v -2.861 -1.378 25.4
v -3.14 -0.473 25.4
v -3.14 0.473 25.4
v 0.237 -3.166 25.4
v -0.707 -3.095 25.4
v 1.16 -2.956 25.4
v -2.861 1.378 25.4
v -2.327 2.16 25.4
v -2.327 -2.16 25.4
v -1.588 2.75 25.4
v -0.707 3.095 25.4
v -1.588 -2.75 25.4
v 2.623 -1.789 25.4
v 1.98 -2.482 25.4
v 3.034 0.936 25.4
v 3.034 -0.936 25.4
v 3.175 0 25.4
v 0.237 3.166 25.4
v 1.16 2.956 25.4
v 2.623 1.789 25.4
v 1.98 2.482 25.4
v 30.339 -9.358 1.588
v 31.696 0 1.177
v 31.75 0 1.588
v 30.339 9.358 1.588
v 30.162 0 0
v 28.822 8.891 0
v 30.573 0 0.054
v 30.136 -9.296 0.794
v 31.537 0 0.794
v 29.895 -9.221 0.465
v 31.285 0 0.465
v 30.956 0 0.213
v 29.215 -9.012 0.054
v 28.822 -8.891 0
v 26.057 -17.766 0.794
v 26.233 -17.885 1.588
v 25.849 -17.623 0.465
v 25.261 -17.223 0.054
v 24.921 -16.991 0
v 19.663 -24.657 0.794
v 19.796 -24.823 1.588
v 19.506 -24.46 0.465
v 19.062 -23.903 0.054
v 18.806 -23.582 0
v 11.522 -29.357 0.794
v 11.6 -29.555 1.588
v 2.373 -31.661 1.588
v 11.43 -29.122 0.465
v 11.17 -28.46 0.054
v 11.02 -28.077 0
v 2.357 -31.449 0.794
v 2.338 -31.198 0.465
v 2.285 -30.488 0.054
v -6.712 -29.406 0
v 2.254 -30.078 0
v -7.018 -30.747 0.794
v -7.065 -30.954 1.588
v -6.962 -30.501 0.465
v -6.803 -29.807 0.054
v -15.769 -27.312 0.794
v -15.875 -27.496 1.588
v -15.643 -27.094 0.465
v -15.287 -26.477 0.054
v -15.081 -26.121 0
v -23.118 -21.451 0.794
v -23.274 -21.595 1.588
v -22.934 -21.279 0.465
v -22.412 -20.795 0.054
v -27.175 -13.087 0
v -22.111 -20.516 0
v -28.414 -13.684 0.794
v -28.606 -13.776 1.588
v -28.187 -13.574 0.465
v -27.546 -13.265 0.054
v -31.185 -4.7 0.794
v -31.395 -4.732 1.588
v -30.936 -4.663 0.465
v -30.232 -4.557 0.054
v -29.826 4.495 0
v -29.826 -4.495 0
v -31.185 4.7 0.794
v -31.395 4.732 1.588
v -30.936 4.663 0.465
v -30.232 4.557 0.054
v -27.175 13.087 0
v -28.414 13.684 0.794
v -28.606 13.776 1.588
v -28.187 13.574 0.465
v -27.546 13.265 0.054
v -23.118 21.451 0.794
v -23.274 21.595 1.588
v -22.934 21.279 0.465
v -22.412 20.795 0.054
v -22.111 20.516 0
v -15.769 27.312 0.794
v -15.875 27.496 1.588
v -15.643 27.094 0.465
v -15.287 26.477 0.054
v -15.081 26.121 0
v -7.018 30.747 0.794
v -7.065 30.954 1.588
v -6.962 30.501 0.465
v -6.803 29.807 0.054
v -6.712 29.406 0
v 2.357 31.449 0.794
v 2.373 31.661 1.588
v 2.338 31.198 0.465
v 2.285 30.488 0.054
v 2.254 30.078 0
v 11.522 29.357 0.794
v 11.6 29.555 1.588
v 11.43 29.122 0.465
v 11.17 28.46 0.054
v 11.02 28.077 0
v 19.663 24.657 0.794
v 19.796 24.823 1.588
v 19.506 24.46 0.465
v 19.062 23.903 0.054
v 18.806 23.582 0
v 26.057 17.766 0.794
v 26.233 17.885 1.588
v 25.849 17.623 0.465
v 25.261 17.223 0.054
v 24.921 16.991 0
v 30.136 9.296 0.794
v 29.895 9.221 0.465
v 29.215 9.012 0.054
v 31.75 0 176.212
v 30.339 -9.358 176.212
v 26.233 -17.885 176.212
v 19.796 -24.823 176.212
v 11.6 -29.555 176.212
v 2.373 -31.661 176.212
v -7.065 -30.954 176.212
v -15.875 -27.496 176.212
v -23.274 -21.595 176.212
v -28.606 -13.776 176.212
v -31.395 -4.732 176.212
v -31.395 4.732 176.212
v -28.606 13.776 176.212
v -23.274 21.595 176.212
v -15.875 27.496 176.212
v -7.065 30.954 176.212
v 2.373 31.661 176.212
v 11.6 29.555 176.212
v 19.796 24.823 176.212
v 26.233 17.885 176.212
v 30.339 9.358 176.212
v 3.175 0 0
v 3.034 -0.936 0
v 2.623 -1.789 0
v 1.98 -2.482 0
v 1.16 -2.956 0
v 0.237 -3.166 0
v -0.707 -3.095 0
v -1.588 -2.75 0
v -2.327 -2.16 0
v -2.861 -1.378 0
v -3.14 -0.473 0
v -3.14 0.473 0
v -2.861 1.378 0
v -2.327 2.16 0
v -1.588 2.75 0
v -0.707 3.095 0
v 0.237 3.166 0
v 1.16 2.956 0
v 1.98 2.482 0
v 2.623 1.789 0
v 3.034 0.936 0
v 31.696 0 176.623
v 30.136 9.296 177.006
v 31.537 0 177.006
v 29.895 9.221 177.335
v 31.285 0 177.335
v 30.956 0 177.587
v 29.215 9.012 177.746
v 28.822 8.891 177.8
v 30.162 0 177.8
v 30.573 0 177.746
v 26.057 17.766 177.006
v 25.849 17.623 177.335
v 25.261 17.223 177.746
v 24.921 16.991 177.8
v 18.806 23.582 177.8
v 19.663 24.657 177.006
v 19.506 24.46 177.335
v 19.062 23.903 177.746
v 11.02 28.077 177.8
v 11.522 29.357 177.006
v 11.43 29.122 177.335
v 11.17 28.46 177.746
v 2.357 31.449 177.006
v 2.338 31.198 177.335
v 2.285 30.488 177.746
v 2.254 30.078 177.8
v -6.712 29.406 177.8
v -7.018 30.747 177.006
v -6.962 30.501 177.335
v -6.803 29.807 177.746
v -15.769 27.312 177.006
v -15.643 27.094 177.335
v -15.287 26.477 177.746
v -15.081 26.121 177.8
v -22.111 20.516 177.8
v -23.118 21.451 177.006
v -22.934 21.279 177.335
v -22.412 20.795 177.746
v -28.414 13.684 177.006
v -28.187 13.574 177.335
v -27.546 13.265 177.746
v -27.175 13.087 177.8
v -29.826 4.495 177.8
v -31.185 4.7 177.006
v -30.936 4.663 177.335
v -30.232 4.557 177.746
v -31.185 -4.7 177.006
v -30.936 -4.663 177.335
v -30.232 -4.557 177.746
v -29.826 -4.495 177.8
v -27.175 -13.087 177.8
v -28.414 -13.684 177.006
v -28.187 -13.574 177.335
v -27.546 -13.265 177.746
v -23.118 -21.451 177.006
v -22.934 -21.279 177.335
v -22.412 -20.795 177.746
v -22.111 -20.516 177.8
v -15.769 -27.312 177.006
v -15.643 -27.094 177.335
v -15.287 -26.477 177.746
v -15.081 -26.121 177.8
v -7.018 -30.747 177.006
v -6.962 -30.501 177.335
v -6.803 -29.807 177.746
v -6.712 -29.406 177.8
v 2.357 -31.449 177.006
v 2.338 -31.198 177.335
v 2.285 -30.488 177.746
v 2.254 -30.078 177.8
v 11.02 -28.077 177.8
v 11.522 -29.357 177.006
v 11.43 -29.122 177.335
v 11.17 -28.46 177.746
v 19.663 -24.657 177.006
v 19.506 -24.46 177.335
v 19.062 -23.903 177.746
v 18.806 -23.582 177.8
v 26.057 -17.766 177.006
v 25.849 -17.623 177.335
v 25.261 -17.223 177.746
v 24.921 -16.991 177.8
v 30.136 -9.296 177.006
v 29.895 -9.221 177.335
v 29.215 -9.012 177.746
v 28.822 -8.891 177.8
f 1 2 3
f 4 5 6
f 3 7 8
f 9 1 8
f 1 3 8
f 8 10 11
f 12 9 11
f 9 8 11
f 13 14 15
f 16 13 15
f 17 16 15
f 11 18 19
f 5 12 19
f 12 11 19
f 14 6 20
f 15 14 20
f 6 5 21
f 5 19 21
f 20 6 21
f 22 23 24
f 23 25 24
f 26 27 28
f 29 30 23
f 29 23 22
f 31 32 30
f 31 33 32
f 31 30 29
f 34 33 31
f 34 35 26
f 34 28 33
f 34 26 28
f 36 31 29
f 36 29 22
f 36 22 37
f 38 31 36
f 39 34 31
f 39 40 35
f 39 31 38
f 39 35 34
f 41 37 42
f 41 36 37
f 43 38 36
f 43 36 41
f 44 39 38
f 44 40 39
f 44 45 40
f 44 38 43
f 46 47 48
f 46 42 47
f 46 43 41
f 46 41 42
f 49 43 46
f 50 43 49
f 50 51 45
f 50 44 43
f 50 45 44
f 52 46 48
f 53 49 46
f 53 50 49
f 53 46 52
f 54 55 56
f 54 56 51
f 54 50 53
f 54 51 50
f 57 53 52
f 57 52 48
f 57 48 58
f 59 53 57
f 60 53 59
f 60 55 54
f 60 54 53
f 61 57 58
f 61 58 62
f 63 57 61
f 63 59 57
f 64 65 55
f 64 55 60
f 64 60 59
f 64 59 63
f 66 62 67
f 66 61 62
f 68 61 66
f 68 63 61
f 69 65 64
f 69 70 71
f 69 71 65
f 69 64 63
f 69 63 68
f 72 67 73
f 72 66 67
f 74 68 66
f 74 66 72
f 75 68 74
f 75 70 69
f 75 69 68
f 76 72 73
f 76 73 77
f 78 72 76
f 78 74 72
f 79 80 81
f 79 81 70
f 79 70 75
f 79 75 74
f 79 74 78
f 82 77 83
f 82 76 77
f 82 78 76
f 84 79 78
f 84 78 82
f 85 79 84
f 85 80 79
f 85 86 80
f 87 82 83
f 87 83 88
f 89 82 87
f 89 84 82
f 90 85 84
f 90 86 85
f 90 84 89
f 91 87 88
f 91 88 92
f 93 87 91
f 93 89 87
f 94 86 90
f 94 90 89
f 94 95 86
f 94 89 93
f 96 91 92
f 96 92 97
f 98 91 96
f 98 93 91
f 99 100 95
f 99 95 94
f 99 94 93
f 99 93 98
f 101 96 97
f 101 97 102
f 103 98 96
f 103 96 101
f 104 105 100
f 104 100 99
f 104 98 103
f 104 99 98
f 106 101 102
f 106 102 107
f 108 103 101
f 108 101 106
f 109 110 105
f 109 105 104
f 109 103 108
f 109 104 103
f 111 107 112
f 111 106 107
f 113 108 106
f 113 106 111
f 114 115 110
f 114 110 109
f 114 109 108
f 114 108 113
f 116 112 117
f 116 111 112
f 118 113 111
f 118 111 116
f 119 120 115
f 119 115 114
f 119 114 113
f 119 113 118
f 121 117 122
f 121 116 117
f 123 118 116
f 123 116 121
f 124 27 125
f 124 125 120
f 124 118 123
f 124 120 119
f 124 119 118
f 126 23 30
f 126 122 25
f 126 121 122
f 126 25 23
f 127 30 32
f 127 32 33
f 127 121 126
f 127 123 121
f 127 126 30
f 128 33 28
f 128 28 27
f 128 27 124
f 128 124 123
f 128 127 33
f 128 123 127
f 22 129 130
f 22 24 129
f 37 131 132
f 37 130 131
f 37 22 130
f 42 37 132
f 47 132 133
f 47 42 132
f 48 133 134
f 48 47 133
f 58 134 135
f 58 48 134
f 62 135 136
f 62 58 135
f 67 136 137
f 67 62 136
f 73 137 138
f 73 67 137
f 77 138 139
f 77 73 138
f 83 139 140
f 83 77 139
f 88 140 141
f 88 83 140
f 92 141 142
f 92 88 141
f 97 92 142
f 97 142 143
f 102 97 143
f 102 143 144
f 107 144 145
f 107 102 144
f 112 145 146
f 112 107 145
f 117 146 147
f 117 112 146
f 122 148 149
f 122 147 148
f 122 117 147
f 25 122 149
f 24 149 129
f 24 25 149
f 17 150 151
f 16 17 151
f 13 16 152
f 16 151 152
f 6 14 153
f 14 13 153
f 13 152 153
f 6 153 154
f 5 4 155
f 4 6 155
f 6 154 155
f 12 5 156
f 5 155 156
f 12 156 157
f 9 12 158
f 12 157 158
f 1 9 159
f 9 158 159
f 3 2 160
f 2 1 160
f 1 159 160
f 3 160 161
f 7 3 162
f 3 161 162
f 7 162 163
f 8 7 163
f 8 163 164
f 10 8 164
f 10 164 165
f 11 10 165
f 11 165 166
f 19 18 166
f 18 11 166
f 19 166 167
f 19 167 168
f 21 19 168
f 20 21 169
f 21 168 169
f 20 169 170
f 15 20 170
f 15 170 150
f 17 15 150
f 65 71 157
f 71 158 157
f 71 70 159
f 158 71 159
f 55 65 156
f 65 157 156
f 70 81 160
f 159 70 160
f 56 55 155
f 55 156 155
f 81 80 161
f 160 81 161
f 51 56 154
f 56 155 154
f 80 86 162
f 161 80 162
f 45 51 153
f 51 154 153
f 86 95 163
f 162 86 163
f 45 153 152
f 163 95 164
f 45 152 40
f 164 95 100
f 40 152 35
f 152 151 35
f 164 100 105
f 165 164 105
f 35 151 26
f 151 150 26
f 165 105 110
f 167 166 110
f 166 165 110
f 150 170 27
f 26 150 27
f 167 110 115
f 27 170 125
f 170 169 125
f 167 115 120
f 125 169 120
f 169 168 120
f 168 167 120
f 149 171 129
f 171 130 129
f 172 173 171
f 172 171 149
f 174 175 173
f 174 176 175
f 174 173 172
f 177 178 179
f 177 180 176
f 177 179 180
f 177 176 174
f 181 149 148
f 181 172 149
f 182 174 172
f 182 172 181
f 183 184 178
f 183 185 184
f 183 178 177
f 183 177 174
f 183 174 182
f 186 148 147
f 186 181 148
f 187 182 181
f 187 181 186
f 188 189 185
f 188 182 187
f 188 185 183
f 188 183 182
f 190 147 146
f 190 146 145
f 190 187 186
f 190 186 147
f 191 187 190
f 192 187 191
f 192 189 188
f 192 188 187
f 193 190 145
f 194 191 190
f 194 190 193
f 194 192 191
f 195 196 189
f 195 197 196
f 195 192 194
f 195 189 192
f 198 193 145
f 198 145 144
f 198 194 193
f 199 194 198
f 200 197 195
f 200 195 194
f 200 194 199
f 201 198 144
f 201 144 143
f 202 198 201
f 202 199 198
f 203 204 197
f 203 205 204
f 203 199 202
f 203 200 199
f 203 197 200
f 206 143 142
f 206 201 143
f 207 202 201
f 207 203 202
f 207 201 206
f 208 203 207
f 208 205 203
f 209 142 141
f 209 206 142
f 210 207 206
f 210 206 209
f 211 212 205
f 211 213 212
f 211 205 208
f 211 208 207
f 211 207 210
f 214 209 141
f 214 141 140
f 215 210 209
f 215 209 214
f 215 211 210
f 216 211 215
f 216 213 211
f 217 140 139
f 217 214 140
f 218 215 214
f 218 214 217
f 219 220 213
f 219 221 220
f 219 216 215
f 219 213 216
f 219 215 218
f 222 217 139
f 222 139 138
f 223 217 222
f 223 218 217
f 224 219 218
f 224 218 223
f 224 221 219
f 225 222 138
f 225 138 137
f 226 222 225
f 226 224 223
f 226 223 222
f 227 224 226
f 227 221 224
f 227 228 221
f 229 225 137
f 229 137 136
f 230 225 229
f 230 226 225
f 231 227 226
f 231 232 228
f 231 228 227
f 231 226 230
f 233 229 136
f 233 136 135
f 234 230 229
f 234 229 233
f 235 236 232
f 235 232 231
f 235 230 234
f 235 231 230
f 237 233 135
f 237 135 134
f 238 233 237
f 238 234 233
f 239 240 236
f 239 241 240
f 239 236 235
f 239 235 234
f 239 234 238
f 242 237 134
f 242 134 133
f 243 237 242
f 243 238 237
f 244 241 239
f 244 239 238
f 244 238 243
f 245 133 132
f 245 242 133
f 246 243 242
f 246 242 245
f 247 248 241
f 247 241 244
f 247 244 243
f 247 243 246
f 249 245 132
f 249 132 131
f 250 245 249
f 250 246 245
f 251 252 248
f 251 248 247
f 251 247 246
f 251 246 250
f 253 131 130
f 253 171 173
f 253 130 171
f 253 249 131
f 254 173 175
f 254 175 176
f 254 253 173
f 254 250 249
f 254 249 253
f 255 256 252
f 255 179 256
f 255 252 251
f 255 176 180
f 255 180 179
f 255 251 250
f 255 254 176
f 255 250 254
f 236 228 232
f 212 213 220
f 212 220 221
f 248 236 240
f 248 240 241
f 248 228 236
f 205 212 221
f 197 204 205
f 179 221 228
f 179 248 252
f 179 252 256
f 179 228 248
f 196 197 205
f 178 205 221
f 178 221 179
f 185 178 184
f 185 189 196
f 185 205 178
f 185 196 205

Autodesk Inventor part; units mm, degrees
ref_plane "YZ Plane" through (0, 0, 0) normal (1, 0, 0) x (0, 1, 0)
ref_plane "XZ Plane" through (0, 0, 0) normal (0, 1, 0) x (-1, 0, 0)
ref_plane "XY Plane" through (0, 0, 0) normal (0, 0, 1) x (1, 0, 0)
sketch "Sketch1" plane through (0, 0, 0) normal (0, 0, 1) x (1, 0, 0)
  circle A0 centre (0, 0) radius 31.75
  circle A1 centre (0, 0) radius 3.175
  dimension "d0" = 63.5
  dimension "d3" = 6.35
extrude "Extrusion1" add sketch "Sketch1" along normal blind 177.8 contours A0 | A1
extrude "Extrusion2" cut sketch "Sketch1" along normal blind 25.4 contours A1
thread "Thread1" size "1/4-20 UNC" class "2B" standard "ANSI Unified Screw Threads" full length
fillet "Fillet1" radius 1.5875 2 edges at (-31.75, 0, 177.8) (-31.75, 0, 0)
properties part number "Climber Extra Weight Cylinder" material "Aluminum 6061"
